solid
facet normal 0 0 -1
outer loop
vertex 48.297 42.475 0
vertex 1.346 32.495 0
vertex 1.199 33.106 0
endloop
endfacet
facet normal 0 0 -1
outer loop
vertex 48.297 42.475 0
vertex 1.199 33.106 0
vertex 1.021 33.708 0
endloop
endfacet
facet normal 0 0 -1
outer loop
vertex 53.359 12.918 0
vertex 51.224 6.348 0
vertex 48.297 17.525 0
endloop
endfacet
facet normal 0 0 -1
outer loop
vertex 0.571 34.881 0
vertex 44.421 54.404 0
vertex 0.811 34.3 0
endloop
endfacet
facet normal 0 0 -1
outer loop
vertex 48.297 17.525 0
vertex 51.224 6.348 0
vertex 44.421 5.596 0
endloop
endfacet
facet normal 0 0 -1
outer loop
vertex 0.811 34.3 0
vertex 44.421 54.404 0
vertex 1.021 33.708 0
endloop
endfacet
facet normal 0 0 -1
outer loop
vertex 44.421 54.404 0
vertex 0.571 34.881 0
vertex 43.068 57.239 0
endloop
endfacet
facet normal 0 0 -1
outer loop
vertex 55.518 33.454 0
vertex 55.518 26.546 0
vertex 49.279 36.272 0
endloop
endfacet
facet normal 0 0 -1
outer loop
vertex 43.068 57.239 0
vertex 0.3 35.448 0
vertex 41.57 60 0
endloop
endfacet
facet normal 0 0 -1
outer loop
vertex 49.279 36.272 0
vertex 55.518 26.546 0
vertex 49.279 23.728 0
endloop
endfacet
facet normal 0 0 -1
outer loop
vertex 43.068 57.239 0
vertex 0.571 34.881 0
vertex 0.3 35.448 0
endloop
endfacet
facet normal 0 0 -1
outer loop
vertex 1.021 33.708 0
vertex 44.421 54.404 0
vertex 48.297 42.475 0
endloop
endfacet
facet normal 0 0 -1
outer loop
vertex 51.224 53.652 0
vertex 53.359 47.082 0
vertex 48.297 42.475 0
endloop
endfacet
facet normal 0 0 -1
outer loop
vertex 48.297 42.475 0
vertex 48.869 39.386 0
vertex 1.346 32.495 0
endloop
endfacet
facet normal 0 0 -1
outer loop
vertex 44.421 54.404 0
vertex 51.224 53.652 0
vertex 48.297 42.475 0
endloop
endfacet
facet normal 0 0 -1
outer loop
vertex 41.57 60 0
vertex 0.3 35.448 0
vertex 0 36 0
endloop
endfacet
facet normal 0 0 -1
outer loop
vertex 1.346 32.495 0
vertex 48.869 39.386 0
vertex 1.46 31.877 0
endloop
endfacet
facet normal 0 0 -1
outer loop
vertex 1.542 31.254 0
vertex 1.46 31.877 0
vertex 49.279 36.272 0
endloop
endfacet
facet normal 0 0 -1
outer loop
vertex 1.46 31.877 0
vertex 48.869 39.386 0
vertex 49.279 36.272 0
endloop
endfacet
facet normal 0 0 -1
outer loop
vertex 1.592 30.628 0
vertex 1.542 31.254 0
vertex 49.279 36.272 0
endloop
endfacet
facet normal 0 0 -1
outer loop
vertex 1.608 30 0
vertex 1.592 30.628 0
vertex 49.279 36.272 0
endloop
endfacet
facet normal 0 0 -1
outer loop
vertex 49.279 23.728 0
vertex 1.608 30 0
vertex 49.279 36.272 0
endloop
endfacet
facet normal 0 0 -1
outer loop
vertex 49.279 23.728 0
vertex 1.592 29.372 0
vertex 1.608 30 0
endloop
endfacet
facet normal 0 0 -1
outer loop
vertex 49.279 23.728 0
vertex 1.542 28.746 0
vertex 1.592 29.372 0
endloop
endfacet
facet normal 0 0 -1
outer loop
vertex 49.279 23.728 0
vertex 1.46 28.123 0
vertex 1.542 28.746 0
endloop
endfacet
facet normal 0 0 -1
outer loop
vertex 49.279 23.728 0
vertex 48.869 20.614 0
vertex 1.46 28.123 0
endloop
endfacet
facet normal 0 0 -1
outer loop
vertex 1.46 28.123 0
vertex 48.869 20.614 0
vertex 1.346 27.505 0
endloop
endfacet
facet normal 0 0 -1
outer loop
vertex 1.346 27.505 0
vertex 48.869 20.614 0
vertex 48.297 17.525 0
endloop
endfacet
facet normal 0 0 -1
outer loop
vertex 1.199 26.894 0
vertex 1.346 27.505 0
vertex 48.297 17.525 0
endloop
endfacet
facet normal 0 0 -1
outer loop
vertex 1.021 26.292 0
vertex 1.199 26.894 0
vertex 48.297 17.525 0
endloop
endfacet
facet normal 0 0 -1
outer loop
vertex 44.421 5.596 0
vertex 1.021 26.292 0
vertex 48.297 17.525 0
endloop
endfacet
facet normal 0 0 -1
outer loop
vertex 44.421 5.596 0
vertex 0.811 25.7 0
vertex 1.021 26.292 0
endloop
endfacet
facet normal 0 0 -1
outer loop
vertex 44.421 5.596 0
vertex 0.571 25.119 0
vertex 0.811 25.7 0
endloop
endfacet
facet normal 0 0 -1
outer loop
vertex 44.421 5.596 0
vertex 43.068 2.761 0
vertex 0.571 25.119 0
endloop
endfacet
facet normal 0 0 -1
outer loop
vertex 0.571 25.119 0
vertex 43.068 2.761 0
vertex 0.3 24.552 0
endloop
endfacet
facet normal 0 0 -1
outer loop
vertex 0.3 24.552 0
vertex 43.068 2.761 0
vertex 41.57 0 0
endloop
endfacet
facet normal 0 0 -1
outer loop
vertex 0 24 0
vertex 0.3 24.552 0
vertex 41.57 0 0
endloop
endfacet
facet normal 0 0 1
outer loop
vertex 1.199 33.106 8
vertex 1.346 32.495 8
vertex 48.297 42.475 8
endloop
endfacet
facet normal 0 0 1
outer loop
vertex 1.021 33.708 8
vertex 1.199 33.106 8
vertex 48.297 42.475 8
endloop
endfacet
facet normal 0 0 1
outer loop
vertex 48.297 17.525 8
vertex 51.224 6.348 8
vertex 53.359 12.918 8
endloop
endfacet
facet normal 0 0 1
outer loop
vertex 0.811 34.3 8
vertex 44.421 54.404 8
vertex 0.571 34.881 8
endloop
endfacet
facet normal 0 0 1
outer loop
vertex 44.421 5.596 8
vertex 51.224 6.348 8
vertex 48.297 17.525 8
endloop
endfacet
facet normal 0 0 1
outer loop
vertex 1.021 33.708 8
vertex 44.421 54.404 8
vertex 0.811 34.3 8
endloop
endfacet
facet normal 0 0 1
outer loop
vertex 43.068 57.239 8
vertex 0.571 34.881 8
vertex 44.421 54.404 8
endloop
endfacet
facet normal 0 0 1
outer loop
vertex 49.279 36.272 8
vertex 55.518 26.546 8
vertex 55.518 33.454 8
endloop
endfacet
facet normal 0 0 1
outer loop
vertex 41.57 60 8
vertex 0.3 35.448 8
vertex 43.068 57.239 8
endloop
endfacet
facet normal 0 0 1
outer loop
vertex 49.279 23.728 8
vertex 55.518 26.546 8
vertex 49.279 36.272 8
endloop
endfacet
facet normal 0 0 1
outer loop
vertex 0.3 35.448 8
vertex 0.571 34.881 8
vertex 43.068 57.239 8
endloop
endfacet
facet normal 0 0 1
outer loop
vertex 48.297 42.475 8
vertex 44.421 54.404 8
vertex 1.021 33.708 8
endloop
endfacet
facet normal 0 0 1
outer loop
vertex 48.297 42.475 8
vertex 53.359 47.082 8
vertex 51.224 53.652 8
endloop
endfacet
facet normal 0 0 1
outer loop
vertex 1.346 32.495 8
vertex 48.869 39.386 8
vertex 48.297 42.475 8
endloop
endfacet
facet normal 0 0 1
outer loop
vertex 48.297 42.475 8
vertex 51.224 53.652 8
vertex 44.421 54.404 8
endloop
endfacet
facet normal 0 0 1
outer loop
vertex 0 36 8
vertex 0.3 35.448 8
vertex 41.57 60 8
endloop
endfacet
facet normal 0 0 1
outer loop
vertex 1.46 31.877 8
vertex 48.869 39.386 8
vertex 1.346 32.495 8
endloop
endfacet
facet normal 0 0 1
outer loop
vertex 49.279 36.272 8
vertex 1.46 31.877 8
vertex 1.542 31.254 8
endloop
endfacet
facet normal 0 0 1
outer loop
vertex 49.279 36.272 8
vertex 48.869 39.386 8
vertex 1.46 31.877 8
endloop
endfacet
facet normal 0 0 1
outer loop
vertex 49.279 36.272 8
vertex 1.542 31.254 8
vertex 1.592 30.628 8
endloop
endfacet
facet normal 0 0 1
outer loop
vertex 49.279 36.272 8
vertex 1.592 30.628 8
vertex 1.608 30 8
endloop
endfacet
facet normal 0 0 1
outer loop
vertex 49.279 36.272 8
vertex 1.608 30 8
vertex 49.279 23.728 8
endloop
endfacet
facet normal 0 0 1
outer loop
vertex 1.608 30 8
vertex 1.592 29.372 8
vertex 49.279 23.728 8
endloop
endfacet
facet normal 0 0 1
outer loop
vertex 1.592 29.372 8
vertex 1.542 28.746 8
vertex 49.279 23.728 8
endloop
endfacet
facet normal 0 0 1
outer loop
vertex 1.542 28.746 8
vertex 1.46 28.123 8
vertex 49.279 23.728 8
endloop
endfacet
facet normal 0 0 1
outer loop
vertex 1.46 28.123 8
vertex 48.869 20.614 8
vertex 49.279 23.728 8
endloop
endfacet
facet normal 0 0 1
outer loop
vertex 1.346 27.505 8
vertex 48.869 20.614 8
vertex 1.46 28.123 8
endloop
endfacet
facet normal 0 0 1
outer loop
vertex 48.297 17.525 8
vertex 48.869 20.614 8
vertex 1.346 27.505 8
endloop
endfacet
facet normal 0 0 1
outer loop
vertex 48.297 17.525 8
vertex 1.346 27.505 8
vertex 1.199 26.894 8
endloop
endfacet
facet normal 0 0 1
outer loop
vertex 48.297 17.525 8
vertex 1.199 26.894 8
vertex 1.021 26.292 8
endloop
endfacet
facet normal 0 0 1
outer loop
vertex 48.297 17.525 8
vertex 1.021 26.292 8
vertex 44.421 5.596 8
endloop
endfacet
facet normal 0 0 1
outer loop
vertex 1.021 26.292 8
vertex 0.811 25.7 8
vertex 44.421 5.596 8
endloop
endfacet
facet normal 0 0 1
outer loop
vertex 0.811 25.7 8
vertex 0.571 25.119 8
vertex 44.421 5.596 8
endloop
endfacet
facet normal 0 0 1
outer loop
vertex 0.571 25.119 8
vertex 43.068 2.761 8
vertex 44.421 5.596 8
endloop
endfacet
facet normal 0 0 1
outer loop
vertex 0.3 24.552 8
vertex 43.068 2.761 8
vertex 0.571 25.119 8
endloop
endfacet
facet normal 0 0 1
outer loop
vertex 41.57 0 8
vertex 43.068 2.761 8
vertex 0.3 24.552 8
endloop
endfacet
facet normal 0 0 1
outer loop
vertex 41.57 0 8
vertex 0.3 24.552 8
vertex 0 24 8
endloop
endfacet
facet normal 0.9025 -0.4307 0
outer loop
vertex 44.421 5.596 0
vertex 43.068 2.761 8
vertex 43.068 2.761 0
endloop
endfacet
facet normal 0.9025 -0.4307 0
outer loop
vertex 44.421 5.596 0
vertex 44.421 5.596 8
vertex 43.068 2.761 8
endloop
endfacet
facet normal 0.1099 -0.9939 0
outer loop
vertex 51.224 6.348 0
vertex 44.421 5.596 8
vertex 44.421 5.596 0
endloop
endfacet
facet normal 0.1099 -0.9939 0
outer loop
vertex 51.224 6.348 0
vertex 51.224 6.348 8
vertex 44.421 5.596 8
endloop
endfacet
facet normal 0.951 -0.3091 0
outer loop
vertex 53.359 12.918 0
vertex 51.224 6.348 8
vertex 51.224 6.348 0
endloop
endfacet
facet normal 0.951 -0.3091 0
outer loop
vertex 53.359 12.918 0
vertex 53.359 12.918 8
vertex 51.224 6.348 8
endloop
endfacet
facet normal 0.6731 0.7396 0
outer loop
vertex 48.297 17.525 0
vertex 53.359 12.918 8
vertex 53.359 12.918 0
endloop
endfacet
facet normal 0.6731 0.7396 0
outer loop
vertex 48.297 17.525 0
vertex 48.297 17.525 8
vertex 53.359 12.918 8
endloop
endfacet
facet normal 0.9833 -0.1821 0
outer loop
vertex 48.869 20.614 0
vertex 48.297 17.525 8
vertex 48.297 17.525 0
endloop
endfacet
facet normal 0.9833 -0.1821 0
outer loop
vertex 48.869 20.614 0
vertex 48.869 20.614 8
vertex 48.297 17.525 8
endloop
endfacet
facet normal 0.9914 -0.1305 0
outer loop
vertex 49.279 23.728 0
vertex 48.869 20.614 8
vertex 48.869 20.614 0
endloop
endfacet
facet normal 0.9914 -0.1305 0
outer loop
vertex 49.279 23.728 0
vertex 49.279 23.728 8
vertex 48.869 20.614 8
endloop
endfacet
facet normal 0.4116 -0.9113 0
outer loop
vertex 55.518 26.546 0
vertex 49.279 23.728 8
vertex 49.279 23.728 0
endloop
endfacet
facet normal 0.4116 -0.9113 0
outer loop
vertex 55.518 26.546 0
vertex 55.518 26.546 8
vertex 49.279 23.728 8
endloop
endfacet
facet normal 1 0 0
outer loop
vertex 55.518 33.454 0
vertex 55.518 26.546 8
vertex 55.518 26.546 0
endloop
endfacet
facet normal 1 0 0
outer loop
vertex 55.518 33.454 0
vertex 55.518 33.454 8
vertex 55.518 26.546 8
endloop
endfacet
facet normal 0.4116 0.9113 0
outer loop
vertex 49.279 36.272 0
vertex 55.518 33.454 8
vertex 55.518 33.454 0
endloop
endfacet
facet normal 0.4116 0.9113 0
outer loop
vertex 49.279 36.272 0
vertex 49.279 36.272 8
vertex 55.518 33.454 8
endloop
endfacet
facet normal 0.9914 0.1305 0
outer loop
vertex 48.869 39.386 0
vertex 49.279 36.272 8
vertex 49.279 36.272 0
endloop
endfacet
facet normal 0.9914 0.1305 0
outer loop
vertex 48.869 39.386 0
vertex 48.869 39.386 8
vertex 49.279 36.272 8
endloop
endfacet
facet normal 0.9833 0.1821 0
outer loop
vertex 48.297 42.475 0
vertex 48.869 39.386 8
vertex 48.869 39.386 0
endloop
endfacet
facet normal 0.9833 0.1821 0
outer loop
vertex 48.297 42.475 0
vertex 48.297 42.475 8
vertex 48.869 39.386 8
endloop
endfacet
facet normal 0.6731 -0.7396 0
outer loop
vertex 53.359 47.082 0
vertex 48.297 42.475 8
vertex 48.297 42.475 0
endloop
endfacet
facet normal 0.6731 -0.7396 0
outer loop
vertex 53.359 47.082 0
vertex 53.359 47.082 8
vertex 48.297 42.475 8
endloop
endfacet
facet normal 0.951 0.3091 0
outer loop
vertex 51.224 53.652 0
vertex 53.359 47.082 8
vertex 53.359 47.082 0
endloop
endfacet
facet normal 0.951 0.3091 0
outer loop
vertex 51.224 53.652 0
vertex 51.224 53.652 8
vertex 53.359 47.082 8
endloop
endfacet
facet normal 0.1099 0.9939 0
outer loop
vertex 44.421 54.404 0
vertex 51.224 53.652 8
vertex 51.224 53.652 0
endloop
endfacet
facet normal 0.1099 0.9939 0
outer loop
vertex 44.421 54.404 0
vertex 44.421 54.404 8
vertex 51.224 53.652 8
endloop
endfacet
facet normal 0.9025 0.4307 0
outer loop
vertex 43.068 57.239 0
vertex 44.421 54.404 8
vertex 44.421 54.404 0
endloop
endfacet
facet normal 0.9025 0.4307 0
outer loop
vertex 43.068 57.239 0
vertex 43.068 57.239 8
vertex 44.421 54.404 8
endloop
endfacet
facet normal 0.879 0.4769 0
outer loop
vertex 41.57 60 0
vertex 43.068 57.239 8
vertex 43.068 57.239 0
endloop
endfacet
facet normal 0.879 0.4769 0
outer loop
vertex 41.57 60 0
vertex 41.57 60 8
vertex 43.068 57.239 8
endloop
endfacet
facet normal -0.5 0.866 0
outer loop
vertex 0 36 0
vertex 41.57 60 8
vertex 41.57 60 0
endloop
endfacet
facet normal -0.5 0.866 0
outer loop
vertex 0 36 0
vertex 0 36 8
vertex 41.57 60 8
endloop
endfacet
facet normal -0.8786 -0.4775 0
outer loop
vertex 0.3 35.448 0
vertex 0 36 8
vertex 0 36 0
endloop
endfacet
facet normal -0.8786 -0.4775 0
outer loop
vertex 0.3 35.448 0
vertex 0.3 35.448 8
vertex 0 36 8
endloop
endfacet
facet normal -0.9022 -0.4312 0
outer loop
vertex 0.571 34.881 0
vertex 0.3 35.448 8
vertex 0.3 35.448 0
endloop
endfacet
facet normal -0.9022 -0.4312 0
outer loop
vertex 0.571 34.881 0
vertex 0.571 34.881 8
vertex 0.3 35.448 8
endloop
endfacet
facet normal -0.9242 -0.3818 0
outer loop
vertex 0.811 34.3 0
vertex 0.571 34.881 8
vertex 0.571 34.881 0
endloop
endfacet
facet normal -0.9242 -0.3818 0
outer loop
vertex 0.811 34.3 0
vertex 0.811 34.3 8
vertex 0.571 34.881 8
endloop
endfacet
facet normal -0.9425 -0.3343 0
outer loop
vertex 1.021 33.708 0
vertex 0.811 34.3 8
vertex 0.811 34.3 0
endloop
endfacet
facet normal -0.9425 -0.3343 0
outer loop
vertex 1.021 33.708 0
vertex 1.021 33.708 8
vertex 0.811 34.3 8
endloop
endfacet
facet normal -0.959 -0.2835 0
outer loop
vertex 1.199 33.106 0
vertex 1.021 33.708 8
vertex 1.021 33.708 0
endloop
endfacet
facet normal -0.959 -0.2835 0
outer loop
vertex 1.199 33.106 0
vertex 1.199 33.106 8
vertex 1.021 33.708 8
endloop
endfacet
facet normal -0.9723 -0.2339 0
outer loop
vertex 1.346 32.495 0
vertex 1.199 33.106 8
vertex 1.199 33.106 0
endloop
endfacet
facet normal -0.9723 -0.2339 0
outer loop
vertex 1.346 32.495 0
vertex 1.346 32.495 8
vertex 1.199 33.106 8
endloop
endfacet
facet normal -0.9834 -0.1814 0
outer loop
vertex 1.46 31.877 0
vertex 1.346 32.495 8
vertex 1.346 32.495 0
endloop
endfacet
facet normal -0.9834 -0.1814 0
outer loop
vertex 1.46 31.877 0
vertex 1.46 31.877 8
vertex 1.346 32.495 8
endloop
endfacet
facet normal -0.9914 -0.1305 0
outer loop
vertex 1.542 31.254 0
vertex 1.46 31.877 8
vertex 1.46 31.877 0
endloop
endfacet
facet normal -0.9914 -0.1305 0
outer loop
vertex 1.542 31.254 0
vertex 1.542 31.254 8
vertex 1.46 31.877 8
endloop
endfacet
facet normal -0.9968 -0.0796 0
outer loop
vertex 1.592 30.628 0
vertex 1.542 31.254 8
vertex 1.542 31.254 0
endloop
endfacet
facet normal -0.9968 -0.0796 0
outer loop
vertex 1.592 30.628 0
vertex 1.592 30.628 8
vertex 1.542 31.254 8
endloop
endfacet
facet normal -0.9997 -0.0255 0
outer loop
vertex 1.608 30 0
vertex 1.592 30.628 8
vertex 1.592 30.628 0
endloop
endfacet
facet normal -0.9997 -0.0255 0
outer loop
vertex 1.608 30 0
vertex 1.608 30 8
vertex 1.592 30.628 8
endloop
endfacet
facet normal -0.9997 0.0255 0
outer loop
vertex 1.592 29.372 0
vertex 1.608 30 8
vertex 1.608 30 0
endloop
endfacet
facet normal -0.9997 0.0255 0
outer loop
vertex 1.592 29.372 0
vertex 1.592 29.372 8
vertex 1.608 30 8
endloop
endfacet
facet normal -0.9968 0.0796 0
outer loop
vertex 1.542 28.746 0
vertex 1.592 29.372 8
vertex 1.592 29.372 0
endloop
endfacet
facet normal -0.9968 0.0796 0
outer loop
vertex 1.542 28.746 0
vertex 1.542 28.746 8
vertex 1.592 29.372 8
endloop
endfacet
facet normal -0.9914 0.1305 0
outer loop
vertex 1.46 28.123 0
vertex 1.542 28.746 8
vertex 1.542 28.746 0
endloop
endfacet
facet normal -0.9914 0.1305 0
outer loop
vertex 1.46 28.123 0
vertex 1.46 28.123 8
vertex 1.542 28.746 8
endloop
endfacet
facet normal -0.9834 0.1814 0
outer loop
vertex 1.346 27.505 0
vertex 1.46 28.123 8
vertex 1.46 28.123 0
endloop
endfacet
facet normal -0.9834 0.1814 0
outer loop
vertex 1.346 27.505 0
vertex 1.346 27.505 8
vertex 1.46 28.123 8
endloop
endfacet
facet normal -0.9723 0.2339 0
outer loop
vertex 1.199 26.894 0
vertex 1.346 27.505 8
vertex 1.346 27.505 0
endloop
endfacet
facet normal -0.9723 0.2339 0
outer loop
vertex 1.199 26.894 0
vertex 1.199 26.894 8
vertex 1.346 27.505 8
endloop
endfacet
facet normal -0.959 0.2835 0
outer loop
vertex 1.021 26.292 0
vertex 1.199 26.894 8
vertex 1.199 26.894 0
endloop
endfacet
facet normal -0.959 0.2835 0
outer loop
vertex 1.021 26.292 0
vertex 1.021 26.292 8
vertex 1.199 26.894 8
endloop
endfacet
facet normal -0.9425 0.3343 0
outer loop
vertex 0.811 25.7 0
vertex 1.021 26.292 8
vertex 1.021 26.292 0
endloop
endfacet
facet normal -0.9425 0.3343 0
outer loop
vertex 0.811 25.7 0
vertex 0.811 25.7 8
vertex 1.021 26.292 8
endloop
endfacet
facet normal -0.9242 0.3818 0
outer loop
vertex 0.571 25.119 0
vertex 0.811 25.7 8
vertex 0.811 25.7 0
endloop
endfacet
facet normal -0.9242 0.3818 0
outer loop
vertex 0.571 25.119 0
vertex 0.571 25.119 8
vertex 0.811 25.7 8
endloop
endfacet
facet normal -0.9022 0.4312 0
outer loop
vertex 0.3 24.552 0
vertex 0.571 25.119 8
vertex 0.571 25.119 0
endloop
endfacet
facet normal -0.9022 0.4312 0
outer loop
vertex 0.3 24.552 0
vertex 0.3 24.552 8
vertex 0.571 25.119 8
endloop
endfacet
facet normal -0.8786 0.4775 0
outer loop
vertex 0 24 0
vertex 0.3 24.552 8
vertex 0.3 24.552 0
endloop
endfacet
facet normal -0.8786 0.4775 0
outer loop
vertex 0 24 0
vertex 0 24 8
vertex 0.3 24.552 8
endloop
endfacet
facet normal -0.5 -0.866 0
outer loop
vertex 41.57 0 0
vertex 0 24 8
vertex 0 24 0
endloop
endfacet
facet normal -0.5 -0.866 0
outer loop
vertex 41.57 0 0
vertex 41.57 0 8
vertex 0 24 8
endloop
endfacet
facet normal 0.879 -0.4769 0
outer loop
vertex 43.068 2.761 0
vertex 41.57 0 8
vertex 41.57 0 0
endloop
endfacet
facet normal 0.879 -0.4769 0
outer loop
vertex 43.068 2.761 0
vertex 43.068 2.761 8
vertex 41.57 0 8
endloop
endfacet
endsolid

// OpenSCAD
$fn = 32;

// ----------------------------------------------------------------------
// Gear sector: 3 teeth on 60 degrees
// ----------------------------------------------------------------------

// --- parameters (mm) ---
sector_angle = 60;        // sector angle, degrees
root_r = 60;              // root circle radius
tooth_h = 6;              // tooth height over the root circle
teeth = 3;                // number of teeth on the sector
hub_r = 12;               // hub bore radius
plate_t = 8;              // sector thickness, Z
arc_step = 3;             // sampling step of the root/hub arcs, degrees

tip_r = root_r + tooth_h;  // tip circle radius

profile = [[41.57, 0], [43.068, 2.761], [44.421, 5.596], [51.224, 6.348], [53.359, 12.918], [48.297, 17.525], [48.869, 20.614], [49.279, 23.728], [55.518, 26.546], [55.518, 33.454], [49.279, 36.272], [48.869, 39.386], [48.297, 42.475], [53.359, 47.082], [51.224, 53.652], [44.421, 54.404], [43.068, 57.239], [41.57, 60], [0, 36], [0.3, 35.448], [0.571, 34.881], [0.811, 34.3], [1.021, 33.708], [1.199, 33.106], [1.346, 32.495], [1.46, 31.877], [1.542, 31.254], [1.592, 30.628], [1.608, 30], [1.592, 29.372], [1.542, 28.746], [1.46, 28.123], [1.346, 27.505], [1.199, 26.894], [1.021, 26.292], [0.811, 25.7], [0.571, 25.119], [0.3, 24.552], [0, 24]];  // primary outline, 39 points, counter clockwise

// --- the one profile operation ---
linear_extrude(height = plate_t) polygon(points = profile);
